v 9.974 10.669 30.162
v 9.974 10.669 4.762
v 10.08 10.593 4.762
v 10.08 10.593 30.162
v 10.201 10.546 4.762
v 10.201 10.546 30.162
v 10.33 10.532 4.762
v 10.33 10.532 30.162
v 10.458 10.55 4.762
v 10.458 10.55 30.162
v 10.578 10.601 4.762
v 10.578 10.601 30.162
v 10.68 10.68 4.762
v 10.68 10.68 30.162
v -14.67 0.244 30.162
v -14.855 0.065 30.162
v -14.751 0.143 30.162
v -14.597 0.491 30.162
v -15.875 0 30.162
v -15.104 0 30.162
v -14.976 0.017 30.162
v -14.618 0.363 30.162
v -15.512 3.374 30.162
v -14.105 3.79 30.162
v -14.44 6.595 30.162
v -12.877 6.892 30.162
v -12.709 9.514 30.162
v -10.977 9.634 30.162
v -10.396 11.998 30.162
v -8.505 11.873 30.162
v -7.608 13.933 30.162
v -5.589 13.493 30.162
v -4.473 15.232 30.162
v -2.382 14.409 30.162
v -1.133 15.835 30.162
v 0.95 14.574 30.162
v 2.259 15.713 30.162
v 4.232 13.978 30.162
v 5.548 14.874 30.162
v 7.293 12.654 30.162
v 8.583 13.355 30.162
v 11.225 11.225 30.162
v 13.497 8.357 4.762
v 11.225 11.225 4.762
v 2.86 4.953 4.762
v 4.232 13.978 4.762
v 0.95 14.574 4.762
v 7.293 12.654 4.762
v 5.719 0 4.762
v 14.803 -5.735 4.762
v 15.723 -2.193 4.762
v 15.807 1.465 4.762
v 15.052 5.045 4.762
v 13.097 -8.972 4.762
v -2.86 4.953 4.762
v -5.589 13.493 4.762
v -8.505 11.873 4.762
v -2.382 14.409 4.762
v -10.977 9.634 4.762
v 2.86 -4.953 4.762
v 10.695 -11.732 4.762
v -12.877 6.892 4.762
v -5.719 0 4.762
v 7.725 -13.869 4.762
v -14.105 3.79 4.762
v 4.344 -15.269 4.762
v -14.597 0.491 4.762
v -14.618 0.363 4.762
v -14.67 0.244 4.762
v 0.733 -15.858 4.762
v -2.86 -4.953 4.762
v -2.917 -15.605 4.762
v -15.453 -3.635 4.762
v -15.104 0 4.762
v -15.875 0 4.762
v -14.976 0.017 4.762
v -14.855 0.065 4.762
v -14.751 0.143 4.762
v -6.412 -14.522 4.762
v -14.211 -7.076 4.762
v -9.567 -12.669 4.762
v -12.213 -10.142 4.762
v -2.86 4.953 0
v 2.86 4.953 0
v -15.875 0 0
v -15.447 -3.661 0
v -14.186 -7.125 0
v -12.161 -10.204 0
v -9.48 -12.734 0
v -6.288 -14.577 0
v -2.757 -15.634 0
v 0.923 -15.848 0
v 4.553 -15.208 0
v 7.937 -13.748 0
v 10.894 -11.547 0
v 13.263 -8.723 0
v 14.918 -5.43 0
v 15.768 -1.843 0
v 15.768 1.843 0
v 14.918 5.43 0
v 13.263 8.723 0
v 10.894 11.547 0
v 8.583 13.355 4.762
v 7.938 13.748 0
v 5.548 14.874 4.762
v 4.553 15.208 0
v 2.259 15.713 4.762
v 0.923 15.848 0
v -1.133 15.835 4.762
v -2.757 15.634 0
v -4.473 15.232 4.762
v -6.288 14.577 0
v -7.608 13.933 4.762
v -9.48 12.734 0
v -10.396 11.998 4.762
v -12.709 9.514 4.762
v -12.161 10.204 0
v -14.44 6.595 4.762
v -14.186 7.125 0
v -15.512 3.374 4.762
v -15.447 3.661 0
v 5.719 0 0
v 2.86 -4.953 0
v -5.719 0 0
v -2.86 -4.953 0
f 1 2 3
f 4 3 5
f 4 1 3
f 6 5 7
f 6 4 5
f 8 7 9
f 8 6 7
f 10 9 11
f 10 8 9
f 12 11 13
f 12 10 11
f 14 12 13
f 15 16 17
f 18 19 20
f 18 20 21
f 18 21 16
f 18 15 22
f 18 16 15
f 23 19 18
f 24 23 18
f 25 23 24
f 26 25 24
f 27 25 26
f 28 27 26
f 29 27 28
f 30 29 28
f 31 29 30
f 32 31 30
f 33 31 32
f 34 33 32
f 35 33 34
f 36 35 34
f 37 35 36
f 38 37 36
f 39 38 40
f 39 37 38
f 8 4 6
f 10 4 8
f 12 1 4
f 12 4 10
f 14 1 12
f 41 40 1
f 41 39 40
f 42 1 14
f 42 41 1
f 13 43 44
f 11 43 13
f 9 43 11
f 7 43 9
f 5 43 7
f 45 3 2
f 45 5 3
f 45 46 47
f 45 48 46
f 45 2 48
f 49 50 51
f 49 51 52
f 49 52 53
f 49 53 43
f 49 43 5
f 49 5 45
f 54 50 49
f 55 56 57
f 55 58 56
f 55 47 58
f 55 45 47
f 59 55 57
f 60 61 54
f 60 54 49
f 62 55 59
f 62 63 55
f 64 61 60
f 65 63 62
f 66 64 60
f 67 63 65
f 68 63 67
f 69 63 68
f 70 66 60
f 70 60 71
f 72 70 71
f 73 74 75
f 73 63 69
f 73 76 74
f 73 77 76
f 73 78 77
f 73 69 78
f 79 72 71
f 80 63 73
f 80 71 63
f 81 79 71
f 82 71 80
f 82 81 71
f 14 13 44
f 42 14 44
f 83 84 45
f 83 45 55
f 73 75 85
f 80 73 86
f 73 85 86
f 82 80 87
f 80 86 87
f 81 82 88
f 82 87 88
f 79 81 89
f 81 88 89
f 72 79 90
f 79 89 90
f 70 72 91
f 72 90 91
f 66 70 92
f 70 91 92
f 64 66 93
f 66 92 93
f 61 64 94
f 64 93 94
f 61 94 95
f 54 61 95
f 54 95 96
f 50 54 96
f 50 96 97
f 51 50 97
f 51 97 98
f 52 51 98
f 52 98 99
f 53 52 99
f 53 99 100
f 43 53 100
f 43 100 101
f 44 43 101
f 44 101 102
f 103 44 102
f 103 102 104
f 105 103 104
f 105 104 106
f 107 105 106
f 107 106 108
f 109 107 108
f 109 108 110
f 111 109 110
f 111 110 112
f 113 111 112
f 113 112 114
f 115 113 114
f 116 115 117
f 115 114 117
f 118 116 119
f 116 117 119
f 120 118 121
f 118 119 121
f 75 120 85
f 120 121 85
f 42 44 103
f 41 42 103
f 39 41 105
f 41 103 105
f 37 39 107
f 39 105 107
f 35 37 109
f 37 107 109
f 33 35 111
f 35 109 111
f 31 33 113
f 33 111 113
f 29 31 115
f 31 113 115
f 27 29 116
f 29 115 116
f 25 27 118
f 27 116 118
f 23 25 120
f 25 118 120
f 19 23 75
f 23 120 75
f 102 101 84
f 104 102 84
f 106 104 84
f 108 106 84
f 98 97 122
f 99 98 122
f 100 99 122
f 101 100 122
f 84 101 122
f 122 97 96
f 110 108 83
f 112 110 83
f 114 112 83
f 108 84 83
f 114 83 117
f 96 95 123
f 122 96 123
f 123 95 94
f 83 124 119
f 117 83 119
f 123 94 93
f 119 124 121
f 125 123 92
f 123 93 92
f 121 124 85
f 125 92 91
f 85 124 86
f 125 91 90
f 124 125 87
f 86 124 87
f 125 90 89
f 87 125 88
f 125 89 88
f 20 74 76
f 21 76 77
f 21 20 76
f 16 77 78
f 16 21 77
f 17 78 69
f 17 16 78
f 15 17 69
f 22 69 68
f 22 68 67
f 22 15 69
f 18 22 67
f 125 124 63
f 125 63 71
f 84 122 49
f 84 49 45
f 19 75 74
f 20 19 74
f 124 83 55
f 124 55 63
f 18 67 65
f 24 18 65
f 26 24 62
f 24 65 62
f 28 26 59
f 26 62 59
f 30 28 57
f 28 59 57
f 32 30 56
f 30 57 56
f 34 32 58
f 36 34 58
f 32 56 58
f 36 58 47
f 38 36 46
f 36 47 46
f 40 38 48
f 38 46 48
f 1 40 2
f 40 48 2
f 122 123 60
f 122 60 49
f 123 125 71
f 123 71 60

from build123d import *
from build123d.topology import SkipClean

# Parameters (mm, degrees)
SKETCH1_R           = 15.875
BOSS_EXTRUDE1_DEPTH = 4.7625
BOSS_EXTRUDE2_DEPTH = 25.4
FILLET1_R           = 0.508


with BuildPart() as part:
    # Sketch1 → Boss-Extrude1 (new body)
    with BuildSketch(Plane.XY):
        with Locations(Location((0, 0, 0), (0, 0, 180))):
            Circle(SKETCH1_R)
        Polygon((5.719231767, 0), (2.859615883, 4.953), (-2.859615883, 4.953), (-5.719231767, 0), (-2.859615883, -4.953), (2.859615883, -4.953), align=None, mode=Mode.SUBTRACT)
    extrude(amount=BOSS_EXTRUDE1_DEPTH)

    # Sketch2 → Boss-Extrude2 (add)
    with SkipClean():  # the faces are left unmerged after this step: merging them gives an invalid solid
        with BuildSketch(Plane.XY.offset(4.7625)):
            with BuildLine():
                Line((-15.875, 0), (-14.605, 0))
                ThreePointArc((-14.605, 0), (-5.58909153, 13.493260572), (10.327294539, 10.327294539))
                Line((10.327294539, 10.327294539), (11.225320151, 11.225320151))
                ThreePointArc((11.225320151, 11.225320151), (-6.075099489, 14.666587579), (-15.875, 0))
            make_face()
        extrude(amount=BOSS_EXTRUDE2_DEPTH)

    # Fillet1
    fillet1_edges = [part.edges().sort_by_distance(p)[0] for p in [
        (-14.605, 0, 17.4625),
        (10.327294539, 10.327294539, 17.4625),
    ]]
    fillet(fillet1_edges, radius=FILLET1_R)


solid = part.part
